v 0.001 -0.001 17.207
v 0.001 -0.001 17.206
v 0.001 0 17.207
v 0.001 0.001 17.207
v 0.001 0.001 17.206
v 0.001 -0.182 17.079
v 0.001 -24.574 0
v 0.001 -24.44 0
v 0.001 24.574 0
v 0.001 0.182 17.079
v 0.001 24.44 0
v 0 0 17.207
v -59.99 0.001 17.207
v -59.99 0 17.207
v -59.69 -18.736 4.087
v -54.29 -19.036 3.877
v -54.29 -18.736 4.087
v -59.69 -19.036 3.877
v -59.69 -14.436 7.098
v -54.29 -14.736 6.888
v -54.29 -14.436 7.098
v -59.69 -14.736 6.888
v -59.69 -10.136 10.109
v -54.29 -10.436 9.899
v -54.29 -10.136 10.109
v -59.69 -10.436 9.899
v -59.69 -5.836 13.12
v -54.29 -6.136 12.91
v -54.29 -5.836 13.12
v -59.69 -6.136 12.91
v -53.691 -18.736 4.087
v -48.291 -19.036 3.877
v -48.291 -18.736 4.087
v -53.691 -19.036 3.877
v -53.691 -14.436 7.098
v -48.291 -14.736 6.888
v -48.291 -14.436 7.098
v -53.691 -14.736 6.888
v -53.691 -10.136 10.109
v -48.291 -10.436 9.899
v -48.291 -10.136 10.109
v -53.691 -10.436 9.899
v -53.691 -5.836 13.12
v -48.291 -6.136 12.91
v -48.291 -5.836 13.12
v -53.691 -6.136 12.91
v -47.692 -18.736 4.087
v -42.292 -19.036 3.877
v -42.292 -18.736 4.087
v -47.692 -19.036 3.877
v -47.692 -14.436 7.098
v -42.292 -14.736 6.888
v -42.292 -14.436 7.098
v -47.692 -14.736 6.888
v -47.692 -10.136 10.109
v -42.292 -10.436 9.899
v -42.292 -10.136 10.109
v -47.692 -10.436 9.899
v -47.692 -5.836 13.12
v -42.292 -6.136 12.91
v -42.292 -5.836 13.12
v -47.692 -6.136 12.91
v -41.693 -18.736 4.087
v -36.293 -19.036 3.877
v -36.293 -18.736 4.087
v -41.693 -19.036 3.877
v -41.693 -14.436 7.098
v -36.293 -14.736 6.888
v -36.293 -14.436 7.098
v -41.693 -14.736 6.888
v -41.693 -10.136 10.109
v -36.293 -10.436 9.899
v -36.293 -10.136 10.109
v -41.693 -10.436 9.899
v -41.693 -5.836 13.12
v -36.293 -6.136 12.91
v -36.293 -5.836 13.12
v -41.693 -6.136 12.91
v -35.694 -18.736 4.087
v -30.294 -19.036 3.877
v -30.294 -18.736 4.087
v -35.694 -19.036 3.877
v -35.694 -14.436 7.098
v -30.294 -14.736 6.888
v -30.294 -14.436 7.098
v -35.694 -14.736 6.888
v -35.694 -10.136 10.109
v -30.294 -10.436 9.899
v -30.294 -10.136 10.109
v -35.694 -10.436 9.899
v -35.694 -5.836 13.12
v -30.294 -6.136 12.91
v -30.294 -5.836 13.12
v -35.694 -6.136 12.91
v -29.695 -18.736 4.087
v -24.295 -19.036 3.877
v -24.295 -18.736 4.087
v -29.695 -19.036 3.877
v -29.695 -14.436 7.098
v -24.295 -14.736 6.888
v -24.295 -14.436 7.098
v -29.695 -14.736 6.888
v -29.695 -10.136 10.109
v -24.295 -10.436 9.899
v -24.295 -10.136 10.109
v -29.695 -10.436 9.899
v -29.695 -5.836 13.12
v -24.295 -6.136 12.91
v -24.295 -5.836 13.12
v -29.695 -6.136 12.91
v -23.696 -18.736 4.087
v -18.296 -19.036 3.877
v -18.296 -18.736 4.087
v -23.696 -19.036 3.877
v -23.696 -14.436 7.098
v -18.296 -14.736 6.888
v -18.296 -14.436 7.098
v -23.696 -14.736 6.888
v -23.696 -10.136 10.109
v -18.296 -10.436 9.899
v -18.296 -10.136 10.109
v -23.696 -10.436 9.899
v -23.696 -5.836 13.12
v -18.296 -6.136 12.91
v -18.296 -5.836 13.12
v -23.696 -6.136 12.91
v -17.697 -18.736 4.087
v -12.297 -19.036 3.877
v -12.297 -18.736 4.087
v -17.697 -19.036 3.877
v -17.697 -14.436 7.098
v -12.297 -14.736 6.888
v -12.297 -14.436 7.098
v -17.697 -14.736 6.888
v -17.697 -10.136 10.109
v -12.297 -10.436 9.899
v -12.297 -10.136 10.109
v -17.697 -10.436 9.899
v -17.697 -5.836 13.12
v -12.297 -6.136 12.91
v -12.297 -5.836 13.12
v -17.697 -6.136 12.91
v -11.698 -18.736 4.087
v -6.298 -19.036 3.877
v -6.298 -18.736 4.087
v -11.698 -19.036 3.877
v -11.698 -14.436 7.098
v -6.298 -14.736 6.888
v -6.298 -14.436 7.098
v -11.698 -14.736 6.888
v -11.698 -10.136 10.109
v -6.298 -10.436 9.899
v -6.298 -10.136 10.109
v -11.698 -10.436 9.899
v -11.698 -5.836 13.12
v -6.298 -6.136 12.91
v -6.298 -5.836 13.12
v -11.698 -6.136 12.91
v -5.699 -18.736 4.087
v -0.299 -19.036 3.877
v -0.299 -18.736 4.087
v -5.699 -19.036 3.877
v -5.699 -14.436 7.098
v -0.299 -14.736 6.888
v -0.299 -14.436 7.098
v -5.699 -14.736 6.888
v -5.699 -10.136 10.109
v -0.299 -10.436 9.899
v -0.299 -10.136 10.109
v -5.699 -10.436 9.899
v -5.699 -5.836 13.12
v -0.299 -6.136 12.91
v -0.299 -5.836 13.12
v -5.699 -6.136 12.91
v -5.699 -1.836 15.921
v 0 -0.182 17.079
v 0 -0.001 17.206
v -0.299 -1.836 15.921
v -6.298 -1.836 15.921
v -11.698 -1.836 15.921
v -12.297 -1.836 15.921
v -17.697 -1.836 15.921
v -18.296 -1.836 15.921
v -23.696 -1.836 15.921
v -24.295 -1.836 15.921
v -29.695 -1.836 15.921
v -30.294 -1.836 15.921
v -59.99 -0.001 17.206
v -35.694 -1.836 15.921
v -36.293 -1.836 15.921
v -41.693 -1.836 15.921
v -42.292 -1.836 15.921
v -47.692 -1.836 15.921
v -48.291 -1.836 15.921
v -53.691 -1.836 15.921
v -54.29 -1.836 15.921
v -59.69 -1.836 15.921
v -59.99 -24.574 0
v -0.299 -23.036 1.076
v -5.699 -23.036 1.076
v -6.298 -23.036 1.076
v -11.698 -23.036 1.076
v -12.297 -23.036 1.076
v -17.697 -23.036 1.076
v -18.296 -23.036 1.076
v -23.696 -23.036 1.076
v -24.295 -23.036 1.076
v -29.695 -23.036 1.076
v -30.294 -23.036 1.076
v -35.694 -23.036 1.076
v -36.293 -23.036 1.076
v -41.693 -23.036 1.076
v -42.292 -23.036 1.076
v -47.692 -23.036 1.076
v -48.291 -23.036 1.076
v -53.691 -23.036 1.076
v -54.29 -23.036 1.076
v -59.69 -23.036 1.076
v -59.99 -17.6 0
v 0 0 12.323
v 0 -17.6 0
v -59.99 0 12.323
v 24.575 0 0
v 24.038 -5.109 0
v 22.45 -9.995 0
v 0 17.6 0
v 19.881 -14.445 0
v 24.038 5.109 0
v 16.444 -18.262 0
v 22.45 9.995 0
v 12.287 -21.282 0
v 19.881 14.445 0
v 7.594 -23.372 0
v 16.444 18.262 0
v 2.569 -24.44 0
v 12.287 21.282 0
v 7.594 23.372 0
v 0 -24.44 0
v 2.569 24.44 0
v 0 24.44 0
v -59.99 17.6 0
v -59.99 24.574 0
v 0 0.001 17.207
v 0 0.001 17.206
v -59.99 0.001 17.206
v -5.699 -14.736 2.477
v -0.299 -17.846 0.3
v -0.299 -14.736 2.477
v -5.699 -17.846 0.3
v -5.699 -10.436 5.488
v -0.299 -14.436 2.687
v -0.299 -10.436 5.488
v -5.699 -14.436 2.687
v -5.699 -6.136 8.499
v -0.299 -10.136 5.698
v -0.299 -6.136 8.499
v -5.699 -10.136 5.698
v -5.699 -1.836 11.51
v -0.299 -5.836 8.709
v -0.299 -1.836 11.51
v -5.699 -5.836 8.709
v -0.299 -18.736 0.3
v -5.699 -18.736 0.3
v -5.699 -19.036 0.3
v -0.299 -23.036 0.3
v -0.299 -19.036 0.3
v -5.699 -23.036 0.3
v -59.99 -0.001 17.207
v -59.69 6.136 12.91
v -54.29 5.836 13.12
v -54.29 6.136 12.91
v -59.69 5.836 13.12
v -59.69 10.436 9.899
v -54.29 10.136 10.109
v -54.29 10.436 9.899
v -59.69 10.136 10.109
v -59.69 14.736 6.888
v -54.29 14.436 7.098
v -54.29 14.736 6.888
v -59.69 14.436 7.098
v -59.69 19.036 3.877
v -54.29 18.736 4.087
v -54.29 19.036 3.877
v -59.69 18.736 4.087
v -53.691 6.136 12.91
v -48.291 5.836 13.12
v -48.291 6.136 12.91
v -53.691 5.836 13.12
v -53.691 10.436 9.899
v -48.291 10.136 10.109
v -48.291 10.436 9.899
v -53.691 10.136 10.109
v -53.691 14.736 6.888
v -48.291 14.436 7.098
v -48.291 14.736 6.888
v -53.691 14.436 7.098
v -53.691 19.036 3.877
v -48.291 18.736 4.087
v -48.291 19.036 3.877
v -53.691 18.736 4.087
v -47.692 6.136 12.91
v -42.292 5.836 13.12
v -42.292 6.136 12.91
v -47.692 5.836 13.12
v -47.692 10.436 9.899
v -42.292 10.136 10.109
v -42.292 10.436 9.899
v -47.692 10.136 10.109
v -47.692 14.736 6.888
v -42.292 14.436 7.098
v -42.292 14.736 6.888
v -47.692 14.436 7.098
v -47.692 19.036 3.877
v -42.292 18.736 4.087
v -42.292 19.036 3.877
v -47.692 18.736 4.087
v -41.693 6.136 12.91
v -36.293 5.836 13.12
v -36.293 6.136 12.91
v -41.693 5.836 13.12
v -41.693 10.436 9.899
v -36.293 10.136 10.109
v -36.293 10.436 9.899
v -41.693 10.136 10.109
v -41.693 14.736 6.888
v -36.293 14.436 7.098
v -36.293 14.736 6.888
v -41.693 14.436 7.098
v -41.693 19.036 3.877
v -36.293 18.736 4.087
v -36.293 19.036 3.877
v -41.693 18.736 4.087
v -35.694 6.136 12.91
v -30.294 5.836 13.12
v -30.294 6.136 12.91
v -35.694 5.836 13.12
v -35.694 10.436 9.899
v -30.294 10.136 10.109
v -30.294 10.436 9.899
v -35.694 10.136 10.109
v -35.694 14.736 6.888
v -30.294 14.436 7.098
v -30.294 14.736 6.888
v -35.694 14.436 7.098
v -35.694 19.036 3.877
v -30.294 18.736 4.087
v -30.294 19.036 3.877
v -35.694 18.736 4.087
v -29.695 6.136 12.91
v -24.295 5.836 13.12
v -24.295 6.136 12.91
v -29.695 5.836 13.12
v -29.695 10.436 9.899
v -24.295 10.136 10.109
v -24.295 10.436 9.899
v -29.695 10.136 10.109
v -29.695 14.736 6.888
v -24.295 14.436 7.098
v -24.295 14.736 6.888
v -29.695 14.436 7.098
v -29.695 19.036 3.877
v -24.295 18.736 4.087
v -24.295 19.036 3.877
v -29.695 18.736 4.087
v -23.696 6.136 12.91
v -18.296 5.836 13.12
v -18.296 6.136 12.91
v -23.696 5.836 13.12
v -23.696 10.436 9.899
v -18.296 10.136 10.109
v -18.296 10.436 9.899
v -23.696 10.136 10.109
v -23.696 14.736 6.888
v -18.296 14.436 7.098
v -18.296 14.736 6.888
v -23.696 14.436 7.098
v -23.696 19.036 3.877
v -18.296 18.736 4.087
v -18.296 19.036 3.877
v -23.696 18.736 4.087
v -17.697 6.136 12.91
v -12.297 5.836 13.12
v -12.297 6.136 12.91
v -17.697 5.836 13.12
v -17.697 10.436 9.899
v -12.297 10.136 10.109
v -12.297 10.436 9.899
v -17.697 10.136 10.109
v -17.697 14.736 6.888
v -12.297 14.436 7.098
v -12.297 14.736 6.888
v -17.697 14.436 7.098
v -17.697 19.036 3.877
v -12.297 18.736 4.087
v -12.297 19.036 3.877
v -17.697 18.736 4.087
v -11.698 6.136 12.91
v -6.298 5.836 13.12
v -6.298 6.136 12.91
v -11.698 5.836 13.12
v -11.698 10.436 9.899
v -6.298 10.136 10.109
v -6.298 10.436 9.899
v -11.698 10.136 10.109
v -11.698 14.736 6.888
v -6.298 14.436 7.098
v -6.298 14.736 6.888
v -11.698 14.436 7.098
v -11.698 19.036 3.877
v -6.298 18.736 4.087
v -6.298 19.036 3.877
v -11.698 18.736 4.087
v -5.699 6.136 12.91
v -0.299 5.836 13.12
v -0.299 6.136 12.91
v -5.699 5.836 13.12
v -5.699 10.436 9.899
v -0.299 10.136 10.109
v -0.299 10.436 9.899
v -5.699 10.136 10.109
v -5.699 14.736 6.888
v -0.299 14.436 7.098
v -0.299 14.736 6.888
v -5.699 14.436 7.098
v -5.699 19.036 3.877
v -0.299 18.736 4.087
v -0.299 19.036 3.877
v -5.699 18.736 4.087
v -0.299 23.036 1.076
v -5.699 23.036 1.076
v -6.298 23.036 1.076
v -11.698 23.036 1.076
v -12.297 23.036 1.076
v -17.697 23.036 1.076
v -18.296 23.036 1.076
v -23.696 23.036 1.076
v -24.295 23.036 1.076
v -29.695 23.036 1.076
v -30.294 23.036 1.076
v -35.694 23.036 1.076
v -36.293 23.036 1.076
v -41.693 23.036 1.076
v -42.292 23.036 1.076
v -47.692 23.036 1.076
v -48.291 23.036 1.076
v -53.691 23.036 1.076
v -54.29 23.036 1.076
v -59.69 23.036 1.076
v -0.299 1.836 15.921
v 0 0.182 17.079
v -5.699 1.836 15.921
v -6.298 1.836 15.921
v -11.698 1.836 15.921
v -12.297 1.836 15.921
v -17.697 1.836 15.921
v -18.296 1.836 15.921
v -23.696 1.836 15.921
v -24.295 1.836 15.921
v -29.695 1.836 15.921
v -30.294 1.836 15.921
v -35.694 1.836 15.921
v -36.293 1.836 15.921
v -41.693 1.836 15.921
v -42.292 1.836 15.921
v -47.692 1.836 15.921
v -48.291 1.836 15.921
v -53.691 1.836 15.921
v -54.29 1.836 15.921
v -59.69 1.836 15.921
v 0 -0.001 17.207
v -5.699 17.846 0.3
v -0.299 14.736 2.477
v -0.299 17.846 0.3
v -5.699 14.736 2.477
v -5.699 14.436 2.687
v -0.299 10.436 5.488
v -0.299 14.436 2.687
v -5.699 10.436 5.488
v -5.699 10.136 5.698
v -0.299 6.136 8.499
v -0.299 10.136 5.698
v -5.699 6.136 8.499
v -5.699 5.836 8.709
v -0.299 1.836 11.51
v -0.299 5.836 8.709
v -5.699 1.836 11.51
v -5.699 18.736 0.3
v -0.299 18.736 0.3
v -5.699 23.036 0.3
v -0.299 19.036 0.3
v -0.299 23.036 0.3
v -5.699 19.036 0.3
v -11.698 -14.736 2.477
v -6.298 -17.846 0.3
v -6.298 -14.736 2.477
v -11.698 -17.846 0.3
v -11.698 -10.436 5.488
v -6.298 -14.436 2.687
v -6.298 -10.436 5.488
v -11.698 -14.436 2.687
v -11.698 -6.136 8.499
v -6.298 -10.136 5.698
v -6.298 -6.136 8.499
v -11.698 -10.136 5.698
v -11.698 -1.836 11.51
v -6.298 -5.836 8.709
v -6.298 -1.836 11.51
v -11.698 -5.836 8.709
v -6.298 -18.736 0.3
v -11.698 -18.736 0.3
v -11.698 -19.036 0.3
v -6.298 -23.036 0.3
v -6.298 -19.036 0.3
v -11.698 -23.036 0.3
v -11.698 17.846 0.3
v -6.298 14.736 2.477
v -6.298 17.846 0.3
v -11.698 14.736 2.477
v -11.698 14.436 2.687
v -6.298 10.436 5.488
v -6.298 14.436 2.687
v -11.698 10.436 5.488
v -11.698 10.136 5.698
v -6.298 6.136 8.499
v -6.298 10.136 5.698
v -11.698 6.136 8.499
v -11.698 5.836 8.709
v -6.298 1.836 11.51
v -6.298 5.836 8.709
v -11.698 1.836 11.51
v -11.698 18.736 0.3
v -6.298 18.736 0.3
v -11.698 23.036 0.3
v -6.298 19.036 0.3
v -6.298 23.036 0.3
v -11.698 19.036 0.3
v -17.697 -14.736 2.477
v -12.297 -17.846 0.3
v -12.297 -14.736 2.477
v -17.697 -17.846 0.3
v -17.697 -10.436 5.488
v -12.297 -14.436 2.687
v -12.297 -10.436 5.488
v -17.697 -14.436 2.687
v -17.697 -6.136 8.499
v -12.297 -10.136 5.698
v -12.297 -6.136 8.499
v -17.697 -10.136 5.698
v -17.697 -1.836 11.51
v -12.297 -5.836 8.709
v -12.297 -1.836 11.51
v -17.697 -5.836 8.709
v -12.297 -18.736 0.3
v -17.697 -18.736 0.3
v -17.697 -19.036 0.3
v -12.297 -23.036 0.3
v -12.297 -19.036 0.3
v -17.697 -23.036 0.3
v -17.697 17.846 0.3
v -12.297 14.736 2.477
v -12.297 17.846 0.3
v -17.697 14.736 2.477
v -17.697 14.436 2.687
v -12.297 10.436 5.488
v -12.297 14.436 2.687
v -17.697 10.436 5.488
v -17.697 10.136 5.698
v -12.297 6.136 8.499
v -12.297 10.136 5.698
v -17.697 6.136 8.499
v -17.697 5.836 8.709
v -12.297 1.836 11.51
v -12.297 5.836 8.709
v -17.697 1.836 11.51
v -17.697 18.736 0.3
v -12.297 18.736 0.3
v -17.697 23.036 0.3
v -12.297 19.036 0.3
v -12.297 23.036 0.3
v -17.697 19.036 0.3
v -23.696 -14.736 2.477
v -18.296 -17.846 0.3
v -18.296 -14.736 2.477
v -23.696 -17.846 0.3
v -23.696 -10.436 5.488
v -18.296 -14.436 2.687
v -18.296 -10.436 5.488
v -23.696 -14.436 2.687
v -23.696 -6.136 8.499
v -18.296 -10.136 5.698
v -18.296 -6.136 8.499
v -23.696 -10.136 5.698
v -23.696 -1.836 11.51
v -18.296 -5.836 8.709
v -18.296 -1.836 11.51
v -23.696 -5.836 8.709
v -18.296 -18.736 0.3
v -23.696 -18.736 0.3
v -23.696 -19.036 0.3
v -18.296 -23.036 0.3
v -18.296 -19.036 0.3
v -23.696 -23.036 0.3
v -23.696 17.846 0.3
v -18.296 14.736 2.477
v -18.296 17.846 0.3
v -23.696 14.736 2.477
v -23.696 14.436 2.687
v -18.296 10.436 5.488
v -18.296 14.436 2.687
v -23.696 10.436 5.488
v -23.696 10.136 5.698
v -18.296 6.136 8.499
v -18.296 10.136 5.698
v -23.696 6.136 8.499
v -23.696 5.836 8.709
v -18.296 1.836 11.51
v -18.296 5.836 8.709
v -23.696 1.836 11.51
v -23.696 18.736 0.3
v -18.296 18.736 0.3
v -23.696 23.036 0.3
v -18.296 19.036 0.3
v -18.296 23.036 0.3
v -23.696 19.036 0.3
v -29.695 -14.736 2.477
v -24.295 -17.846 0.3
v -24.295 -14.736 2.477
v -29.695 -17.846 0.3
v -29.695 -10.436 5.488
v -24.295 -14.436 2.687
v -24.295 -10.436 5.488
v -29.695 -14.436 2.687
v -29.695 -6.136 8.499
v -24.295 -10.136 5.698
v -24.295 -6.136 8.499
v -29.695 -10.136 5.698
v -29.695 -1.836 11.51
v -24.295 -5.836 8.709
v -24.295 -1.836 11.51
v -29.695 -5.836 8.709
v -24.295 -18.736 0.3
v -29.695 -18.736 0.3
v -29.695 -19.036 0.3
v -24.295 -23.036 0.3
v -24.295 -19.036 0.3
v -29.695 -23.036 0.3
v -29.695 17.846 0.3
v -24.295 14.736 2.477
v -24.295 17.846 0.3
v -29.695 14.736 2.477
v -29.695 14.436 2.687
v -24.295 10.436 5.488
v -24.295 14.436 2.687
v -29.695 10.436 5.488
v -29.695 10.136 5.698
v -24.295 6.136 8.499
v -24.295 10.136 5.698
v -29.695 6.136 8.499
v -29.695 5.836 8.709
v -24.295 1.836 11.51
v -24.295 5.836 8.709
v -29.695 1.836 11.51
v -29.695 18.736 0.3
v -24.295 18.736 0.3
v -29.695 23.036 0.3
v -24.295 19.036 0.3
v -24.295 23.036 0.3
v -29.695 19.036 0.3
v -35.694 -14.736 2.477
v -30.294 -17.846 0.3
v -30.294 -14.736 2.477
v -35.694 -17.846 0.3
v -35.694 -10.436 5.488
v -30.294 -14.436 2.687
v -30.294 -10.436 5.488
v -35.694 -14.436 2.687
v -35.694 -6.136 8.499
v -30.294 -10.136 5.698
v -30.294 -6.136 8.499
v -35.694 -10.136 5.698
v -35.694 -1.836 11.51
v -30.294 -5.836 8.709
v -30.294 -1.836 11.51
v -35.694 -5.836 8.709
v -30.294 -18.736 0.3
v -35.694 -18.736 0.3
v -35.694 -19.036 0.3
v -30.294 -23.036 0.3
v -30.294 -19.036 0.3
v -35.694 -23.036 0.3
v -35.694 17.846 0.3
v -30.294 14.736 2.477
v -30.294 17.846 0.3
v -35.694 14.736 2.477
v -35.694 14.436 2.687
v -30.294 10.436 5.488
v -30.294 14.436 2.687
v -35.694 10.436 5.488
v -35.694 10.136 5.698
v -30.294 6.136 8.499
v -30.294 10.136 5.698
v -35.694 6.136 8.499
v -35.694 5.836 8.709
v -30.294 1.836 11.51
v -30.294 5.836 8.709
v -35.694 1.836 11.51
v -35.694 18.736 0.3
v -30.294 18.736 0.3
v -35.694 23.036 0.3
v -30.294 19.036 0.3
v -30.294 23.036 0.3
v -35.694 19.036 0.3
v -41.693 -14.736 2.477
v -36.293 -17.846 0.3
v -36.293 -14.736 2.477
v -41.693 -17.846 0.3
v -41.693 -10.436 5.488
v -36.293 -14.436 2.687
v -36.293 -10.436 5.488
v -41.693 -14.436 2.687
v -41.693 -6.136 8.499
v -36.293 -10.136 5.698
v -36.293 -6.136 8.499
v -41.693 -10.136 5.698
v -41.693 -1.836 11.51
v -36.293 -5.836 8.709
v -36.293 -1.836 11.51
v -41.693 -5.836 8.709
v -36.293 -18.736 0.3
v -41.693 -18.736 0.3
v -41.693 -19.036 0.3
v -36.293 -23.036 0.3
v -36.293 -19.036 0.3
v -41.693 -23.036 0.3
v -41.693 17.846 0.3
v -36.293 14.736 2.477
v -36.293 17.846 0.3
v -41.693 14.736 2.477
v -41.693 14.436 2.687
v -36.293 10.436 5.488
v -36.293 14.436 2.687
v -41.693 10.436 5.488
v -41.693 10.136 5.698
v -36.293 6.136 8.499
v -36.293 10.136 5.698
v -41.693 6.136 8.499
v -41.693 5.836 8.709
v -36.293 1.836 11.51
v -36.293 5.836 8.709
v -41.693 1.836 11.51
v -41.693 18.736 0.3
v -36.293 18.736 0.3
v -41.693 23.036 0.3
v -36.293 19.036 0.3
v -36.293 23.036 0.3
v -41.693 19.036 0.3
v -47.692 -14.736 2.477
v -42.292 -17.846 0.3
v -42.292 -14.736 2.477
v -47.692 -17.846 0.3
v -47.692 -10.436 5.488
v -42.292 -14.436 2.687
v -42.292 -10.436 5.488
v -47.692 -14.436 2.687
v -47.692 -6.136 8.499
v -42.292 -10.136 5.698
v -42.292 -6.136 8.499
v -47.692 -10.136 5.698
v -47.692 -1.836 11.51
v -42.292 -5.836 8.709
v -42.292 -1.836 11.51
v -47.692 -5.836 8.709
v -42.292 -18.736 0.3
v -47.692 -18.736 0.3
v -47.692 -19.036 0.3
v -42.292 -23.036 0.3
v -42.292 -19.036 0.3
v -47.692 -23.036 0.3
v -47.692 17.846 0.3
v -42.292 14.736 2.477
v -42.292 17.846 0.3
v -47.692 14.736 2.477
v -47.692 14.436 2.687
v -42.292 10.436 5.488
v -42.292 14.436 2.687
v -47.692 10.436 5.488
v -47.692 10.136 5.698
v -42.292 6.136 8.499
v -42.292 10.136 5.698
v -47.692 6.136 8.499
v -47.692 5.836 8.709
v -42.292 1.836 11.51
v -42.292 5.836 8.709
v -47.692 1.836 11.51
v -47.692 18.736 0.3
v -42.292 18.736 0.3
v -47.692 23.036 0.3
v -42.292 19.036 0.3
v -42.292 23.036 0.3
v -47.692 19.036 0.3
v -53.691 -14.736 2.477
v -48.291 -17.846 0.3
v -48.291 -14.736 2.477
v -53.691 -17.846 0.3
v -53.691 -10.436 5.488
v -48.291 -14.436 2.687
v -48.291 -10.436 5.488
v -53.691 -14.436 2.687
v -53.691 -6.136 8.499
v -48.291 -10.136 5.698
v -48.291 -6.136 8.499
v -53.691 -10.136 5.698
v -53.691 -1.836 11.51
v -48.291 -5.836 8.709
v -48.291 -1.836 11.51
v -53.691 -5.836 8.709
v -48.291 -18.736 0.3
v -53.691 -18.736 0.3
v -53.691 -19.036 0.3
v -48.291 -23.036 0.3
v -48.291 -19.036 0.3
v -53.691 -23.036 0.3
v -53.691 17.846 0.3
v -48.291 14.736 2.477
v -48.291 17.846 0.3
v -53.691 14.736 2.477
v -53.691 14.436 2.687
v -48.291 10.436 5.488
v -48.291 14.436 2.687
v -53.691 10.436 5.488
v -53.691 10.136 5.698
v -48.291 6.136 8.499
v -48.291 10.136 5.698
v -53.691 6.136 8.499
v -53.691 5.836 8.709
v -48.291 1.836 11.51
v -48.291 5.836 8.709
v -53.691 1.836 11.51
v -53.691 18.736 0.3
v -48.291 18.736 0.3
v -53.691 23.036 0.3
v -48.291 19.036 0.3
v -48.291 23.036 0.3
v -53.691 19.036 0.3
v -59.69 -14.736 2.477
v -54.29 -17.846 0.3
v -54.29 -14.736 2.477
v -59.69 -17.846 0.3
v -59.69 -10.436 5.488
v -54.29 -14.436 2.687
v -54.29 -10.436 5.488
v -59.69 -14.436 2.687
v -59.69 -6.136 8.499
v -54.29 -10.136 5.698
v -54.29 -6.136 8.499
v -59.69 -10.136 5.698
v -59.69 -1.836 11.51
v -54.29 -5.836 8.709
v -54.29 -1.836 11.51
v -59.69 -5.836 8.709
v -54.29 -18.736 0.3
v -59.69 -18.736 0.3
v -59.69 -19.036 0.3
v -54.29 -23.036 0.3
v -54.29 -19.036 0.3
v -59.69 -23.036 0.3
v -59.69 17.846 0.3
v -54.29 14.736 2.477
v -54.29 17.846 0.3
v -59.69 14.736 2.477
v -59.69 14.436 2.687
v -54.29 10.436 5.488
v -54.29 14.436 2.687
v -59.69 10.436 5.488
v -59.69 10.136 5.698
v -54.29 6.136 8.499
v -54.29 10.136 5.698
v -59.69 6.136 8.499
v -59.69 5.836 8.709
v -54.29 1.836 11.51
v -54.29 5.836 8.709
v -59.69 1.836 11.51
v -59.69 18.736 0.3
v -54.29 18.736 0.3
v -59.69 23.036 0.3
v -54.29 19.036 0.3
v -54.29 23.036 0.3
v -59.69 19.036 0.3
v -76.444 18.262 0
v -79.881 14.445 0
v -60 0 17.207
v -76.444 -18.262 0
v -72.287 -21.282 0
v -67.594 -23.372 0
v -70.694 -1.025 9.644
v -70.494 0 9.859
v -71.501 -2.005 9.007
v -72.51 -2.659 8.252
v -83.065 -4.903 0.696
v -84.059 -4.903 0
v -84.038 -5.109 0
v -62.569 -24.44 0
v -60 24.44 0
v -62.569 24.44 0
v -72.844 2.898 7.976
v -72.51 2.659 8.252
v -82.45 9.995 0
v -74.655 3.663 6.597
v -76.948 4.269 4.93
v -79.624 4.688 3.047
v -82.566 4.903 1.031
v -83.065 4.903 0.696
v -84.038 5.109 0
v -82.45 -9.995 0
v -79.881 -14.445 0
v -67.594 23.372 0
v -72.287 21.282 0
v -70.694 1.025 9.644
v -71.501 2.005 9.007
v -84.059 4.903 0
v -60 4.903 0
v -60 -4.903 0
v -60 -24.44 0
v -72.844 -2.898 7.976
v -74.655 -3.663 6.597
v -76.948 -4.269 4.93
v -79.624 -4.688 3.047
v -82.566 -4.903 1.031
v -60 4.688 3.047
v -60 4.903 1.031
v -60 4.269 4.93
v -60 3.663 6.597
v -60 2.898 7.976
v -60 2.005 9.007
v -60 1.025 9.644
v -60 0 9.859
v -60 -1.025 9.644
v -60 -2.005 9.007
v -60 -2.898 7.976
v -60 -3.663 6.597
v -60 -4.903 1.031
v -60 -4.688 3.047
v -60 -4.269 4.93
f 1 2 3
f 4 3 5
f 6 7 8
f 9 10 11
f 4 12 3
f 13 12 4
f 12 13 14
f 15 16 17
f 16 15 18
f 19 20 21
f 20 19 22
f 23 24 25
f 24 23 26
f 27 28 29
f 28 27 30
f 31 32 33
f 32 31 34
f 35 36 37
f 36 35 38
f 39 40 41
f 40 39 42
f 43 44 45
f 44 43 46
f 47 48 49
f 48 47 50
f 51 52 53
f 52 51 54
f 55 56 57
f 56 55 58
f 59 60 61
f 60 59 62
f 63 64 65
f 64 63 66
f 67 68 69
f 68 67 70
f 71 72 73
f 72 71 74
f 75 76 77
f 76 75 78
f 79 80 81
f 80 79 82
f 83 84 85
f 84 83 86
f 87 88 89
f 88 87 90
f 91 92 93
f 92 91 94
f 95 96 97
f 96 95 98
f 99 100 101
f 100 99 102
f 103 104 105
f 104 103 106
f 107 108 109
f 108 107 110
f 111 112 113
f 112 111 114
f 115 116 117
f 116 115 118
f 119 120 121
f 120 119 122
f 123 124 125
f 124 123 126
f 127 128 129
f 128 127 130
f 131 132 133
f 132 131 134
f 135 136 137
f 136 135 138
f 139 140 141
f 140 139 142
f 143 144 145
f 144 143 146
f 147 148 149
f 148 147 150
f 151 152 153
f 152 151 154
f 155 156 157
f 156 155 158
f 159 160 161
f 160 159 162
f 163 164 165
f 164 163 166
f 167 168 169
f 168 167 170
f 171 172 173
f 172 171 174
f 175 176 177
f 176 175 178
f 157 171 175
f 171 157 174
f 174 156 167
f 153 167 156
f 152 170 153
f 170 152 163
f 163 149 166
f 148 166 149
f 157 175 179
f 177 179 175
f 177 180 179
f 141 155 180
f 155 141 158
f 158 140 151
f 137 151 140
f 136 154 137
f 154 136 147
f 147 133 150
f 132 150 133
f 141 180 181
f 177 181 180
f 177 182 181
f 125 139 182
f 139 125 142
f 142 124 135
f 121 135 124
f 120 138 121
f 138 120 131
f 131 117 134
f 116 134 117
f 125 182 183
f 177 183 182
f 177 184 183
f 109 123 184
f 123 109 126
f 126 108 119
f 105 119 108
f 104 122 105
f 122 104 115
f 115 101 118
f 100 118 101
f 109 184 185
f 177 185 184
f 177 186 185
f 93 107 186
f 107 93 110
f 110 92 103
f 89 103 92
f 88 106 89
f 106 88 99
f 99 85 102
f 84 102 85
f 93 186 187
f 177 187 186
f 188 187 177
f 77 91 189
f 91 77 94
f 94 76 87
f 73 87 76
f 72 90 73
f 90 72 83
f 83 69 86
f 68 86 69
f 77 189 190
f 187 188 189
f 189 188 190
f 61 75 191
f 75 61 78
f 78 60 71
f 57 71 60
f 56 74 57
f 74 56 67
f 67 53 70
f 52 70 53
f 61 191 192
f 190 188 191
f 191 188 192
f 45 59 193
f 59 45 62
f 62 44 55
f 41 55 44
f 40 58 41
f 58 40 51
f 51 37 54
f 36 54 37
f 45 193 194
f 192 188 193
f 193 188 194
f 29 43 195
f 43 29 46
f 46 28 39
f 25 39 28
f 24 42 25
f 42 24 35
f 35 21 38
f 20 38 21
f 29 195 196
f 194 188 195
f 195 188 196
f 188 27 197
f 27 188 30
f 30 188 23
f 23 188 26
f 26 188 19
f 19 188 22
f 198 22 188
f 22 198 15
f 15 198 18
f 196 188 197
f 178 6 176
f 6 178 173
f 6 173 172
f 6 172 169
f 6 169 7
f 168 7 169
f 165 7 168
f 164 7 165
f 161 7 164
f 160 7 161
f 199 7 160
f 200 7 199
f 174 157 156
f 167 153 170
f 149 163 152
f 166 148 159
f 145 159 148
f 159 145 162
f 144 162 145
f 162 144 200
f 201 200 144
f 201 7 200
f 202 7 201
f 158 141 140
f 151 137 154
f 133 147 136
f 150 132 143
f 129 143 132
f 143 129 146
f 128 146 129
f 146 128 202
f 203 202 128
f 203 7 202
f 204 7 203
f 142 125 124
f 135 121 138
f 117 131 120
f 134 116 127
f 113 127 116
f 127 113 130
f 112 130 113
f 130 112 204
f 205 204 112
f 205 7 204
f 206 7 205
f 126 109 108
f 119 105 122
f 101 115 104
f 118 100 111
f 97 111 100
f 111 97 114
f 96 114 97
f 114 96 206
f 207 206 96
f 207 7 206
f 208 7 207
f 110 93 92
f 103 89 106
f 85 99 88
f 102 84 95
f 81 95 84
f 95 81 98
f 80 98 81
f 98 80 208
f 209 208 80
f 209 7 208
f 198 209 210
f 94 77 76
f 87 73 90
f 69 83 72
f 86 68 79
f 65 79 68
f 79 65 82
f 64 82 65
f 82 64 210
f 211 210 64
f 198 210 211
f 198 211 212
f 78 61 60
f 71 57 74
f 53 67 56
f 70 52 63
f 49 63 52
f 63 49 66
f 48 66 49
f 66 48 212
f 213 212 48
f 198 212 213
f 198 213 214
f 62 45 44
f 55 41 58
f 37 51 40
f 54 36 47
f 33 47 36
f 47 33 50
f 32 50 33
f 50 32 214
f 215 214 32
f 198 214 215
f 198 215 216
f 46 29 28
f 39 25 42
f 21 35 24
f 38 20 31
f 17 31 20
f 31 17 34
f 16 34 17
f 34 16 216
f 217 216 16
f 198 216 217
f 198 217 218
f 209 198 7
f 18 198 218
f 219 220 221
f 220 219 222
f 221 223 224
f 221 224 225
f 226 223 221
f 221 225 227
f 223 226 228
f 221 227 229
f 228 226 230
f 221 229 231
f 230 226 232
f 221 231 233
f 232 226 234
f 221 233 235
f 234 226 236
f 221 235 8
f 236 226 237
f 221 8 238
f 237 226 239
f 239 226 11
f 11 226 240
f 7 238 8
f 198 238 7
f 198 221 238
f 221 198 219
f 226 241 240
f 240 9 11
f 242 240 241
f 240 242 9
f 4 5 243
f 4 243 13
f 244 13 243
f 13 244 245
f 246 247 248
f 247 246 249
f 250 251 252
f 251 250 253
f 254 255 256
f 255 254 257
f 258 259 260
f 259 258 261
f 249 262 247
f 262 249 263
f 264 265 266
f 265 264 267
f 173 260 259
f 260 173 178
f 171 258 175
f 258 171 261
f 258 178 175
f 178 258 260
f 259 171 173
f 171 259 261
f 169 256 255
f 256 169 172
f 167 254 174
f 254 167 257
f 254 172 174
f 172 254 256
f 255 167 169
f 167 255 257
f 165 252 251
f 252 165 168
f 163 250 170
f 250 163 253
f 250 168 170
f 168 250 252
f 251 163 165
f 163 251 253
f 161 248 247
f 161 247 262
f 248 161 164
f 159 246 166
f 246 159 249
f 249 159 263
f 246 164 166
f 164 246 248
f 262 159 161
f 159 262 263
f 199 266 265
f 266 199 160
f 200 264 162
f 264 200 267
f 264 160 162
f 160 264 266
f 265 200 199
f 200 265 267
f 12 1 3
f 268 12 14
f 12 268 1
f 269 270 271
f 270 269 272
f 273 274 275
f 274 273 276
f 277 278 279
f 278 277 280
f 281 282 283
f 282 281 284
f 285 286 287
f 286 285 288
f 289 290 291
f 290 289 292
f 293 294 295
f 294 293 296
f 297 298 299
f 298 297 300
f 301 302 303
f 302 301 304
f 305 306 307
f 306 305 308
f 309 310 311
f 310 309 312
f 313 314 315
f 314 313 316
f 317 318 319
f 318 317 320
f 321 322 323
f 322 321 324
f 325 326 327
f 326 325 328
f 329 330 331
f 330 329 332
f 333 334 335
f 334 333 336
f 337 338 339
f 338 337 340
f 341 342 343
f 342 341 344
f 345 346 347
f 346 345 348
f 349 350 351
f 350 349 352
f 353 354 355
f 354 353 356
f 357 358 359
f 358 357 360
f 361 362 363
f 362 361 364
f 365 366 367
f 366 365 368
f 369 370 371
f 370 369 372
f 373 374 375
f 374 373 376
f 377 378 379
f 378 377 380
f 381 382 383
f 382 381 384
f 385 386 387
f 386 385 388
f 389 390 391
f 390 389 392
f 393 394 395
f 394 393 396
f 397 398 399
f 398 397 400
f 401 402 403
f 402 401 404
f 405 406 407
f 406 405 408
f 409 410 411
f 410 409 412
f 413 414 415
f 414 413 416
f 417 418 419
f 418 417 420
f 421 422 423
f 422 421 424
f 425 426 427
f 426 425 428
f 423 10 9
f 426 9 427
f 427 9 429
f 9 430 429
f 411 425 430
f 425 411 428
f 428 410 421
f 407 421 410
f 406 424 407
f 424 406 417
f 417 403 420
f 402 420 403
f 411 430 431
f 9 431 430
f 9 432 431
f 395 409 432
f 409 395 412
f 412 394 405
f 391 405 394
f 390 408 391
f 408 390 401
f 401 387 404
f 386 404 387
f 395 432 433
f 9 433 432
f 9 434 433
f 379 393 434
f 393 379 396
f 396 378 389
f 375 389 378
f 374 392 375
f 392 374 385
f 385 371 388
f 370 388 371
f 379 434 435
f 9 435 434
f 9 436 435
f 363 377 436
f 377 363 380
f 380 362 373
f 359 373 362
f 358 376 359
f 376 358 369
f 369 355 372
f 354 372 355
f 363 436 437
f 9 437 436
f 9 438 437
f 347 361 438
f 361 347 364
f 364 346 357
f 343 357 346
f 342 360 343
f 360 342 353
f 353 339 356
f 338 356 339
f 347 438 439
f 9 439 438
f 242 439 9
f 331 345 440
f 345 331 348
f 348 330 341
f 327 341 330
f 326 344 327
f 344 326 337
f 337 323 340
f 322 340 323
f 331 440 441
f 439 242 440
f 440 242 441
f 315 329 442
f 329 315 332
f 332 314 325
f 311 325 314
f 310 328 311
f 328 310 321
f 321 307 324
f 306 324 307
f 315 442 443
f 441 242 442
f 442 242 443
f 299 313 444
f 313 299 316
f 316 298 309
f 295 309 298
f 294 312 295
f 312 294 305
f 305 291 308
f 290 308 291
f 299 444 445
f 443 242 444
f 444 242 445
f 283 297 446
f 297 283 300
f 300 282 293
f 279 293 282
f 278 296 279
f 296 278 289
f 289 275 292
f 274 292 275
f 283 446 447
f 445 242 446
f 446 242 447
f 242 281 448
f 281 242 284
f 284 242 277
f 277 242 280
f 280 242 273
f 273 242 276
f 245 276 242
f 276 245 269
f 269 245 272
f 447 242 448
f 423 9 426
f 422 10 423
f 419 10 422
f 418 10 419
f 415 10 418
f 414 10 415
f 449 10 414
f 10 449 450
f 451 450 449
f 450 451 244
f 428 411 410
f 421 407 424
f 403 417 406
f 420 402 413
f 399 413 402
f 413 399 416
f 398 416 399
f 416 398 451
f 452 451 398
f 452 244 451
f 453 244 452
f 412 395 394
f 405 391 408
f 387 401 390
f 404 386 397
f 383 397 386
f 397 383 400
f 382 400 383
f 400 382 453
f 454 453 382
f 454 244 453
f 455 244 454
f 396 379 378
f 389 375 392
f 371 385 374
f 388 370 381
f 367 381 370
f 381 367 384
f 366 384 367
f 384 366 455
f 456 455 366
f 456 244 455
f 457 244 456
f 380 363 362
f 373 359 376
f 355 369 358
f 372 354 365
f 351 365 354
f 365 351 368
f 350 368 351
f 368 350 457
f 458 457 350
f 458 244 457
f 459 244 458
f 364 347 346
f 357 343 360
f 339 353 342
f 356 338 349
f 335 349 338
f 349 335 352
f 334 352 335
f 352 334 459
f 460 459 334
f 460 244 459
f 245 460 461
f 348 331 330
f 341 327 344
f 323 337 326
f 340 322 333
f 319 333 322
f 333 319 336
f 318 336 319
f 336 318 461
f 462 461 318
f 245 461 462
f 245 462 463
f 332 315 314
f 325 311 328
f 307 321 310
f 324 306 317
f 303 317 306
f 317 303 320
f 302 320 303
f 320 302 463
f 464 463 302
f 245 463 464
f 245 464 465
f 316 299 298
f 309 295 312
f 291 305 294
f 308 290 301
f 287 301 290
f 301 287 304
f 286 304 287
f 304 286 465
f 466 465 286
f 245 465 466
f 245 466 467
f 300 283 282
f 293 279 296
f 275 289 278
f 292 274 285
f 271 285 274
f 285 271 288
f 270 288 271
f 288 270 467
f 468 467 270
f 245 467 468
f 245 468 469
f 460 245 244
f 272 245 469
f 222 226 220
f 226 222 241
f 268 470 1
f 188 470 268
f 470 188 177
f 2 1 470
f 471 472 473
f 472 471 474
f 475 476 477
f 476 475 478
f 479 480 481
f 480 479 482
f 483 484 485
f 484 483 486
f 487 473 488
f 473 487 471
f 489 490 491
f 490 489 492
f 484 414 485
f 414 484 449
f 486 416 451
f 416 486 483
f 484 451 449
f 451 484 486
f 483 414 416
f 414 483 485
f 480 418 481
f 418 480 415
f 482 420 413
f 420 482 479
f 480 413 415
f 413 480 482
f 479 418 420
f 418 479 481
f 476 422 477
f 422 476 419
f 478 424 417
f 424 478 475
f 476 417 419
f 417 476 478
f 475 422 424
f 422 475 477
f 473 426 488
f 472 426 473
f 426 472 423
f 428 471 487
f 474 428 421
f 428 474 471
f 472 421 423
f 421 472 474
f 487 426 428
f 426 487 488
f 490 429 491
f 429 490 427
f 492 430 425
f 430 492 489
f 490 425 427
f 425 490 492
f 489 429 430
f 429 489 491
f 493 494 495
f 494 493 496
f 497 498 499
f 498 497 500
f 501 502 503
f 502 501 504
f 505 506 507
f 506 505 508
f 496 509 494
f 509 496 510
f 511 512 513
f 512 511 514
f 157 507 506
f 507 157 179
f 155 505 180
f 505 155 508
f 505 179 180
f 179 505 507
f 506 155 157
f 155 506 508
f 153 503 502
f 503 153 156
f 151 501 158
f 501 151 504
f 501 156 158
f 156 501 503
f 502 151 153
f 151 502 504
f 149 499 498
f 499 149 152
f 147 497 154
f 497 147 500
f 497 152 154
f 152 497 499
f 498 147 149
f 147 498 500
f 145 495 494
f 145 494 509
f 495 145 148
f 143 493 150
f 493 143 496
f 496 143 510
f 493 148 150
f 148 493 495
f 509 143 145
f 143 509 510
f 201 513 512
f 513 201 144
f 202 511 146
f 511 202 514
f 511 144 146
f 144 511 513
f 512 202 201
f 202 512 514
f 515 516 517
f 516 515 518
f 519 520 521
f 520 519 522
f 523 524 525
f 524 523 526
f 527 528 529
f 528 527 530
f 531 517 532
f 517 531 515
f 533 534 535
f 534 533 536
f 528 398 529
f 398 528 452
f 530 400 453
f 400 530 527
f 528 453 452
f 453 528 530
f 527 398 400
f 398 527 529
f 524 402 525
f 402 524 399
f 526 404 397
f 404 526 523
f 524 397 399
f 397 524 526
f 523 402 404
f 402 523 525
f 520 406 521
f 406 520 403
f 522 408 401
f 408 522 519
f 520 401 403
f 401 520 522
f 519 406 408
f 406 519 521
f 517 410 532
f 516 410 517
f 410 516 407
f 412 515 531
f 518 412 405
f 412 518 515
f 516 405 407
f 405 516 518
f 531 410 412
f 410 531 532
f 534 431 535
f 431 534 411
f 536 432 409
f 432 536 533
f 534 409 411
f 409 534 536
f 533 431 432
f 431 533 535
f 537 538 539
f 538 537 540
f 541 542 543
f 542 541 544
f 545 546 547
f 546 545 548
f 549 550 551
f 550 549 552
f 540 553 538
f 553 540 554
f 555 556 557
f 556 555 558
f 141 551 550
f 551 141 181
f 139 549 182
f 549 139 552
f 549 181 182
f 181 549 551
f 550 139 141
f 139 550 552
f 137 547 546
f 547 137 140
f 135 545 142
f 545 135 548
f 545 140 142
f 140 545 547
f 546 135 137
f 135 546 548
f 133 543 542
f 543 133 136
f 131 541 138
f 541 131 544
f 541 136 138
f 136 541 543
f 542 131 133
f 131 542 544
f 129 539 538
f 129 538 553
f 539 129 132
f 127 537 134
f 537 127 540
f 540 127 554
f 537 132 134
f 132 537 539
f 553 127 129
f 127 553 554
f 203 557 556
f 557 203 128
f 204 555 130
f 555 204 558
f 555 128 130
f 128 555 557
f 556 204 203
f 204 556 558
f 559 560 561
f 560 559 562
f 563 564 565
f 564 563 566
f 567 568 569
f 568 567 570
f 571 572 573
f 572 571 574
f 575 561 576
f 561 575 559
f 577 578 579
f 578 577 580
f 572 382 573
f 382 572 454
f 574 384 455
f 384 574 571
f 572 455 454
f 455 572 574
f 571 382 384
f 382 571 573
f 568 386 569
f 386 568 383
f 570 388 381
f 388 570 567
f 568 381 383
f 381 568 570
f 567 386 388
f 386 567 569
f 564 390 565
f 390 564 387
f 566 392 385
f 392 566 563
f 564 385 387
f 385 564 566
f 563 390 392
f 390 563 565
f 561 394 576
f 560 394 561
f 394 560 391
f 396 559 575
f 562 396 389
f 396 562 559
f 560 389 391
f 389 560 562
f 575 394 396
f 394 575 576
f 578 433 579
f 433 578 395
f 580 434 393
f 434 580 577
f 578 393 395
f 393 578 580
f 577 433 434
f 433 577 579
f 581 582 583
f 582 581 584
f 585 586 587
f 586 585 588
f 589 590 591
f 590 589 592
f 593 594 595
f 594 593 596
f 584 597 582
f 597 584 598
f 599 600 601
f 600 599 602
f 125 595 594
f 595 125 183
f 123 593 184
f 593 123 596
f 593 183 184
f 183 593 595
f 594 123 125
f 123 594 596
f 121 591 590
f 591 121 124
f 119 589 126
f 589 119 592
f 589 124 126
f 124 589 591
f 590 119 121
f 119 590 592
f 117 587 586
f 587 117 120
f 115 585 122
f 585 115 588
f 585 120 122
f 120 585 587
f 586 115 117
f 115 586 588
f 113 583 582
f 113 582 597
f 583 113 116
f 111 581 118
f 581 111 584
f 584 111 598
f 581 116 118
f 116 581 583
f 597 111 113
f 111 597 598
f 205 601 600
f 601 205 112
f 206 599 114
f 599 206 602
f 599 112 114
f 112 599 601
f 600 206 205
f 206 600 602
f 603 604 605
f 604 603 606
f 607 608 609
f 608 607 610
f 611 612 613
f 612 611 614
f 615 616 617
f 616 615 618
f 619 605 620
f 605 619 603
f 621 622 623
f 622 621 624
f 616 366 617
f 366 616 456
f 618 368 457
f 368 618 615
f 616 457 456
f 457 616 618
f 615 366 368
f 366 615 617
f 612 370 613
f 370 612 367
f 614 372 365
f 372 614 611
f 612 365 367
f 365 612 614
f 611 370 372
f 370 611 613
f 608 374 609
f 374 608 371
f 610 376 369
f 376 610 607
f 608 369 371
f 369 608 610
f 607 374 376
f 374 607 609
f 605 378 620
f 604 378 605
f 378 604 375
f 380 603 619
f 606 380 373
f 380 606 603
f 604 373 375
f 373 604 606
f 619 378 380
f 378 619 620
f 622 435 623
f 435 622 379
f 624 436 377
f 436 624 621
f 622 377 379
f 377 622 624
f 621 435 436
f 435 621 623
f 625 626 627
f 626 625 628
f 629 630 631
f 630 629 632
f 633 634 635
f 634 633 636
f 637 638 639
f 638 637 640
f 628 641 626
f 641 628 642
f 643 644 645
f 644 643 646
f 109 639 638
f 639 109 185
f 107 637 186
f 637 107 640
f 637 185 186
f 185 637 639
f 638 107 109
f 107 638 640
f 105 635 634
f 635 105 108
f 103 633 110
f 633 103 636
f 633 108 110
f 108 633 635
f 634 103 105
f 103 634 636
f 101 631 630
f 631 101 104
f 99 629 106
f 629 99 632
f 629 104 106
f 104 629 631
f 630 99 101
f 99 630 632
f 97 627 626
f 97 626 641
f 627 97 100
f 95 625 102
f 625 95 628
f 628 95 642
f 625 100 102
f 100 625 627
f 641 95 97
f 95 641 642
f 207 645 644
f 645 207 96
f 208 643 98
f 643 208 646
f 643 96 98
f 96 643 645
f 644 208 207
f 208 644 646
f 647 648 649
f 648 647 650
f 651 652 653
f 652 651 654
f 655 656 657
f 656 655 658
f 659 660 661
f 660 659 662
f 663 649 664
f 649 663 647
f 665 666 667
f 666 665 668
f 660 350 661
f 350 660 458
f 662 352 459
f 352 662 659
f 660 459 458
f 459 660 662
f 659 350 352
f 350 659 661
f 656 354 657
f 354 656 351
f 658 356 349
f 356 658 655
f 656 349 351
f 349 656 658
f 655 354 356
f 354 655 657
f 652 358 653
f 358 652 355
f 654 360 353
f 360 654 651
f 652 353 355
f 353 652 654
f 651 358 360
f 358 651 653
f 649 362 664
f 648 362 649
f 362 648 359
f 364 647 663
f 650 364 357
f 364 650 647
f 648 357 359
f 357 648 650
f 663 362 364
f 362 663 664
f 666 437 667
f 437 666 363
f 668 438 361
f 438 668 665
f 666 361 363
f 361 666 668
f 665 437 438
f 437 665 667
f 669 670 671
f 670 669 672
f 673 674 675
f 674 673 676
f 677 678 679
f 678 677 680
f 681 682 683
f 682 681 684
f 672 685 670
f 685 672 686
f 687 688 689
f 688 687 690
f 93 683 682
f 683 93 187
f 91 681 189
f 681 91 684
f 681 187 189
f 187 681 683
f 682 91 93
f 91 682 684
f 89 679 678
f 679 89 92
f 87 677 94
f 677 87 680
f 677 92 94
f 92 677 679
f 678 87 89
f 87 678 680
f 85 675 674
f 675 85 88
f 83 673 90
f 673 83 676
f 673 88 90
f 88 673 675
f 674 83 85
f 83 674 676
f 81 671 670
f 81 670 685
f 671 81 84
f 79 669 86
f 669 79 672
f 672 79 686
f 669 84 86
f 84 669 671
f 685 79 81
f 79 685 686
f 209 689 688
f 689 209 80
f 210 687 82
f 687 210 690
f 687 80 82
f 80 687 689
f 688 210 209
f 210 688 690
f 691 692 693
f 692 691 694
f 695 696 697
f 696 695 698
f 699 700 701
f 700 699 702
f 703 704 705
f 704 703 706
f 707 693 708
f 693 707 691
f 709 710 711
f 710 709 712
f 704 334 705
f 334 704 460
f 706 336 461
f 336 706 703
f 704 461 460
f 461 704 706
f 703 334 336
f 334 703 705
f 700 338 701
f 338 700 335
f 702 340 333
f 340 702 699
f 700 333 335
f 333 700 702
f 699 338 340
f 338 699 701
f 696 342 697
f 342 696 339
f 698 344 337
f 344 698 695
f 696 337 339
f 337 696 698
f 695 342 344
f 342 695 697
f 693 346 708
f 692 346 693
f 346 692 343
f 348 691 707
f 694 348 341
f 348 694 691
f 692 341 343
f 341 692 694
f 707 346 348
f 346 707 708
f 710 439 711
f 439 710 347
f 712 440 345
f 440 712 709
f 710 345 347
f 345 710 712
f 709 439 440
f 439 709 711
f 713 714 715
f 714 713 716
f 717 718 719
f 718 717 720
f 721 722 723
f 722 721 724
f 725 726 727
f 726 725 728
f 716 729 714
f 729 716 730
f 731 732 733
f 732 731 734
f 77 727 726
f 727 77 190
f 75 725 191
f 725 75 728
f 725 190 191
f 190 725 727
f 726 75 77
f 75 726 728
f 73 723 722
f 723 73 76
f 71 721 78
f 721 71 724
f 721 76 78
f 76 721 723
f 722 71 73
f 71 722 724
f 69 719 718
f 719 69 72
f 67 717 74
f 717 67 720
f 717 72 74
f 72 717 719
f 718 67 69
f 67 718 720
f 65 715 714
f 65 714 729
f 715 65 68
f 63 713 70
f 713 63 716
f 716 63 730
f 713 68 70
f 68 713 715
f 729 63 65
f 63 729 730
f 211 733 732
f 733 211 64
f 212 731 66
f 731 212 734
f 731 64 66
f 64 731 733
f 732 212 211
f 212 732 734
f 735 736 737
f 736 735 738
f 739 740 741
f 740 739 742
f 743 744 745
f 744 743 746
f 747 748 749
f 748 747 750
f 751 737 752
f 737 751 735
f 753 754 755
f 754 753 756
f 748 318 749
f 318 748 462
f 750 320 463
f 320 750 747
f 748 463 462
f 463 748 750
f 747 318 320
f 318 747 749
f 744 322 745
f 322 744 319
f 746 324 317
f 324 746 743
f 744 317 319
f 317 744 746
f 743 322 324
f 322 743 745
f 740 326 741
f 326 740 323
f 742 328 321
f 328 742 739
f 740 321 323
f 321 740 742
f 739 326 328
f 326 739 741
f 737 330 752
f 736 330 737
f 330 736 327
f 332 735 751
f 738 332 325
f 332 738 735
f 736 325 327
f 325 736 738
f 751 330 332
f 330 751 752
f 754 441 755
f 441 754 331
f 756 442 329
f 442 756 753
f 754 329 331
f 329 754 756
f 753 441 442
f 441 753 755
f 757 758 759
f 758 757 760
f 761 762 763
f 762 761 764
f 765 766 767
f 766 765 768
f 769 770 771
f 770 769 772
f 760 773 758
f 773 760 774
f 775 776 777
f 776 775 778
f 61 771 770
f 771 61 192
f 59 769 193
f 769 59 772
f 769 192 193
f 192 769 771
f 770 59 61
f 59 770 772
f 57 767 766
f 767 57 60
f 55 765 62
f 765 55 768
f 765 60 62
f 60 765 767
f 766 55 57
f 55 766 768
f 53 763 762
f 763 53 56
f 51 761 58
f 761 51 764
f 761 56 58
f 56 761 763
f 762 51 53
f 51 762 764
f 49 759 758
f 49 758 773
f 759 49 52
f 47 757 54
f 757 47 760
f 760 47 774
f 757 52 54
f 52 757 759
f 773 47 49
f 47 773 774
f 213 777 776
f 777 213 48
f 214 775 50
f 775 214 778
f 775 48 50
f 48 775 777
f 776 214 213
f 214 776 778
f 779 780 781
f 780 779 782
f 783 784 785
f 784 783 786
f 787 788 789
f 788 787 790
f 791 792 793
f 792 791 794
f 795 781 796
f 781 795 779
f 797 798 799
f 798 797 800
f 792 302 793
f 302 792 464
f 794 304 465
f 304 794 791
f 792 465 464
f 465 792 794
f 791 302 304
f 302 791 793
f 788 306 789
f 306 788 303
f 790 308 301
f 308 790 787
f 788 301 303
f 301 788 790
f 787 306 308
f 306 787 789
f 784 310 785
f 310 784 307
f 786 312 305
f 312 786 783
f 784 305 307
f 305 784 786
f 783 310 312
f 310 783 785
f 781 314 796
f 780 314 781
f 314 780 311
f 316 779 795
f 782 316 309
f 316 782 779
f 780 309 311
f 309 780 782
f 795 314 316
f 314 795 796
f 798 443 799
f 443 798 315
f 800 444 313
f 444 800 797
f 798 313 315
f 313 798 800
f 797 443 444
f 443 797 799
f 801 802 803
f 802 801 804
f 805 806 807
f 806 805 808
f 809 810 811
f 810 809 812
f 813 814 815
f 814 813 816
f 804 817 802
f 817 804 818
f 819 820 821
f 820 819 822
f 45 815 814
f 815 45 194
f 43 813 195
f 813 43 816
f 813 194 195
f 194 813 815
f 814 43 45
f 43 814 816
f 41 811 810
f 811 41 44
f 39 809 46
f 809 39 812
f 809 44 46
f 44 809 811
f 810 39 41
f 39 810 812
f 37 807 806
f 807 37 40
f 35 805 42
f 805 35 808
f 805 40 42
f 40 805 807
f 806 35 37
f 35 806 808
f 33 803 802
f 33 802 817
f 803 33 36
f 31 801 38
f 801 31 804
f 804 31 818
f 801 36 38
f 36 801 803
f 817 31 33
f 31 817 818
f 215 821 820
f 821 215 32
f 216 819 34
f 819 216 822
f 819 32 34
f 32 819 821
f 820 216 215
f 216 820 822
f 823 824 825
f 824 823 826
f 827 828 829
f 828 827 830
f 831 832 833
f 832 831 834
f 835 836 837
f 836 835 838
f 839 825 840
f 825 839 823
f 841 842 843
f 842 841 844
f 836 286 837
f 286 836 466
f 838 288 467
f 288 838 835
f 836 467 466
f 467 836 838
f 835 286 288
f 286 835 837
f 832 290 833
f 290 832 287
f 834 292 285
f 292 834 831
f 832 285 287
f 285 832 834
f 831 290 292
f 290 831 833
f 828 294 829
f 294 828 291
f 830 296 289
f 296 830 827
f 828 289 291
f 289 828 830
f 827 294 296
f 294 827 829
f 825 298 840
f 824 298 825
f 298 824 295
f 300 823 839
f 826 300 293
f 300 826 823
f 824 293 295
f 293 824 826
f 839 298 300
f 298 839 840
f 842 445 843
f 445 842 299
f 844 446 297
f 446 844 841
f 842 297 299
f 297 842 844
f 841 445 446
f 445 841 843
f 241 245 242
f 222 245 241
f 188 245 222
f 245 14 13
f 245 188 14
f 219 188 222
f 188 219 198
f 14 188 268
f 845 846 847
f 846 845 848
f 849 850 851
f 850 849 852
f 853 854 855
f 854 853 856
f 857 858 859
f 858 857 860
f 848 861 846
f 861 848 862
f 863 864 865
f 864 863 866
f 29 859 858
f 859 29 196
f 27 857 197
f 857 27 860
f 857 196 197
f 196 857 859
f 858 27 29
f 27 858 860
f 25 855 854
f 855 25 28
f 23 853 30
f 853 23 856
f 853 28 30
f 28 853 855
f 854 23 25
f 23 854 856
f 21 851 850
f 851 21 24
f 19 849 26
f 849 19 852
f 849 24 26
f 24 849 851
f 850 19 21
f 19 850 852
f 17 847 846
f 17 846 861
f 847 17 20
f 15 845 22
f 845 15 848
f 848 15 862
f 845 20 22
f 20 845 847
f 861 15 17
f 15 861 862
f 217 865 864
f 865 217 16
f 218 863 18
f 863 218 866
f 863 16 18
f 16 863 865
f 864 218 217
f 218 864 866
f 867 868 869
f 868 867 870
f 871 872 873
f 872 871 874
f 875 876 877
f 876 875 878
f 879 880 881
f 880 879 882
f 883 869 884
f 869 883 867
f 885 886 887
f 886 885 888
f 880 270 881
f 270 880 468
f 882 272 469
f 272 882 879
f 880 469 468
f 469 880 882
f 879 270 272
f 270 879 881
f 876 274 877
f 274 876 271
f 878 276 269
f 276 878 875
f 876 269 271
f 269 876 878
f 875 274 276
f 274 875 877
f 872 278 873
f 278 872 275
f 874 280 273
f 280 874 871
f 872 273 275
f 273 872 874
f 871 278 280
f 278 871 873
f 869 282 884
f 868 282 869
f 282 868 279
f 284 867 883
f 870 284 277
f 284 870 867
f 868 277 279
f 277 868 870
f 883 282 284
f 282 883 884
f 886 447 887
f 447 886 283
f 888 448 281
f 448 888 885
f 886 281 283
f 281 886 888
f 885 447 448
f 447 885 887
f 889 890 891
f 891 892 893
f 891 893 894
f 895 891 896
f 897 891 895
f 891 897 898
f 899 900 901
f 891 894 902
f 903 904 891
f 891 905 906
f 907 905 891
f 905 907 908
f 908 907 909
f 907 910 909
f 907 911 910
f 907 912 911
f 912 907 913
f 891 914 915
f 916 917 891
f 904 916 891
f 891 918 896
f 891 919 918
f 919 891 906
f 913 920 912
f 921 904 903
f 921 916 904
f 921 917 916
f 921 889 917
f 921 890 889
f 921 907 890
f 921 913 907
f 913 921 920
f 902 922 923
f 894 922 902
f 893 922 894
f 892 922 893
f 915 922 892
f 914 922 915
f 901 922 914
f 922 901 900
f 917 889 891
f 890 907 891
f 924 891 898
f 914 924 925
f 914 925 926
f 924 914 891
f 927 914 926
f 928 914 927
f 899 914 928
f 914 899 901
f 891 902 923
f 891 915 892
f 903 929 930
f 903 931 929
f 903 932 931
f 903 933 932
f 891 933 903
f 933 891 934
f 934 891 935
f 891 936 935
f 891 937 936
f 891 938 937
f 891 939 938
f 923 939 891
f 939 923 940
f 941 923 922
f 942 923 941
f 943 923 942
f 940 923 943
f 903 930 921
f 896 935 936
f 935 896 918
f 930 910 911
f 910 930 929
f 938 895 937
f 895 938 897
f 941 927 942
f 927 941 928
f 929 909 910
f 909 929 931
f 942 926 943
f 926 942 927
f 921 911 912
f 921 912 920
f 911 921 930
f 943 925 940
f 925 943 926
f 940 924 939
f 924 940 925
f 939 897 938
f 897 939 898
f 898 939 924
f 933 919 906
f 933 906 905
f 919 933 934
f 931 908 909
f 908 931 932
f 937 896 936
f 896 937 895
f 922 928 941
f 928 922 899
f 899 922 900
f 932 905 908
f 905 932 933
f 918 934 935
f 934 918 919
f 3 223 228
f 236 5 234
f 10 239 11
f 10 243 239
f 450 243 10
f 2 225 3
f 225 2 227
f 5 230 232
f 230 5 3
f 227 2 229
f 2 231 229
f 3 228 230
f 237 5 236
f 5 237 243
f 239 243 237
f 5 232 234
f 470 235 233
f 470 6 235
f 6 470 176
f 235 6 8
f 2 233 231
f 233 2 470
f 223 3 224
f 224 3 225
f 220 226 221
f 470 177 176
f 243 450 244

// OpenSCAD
//Customizable struts for regolith-shielded dugout houses
//Ari M. Diacou - June 2014
//Published at: http://www.thingiverse.com/thing:348765
//Shared under Creative Commons License: Attribution-ShareAlike 3.0 Unported (CC BY-SA 3.0) 
//see http://creativecommons.org/licenses/by-sa/3.0/

// preview[view:south west, tilt:top diagonal]

//Width of a strut
width=6;
//Longest outside length of a strut
length=30;
//Transvers thickness of a strut
thickness=4;
//How wide should the bins be in the length direction
bin_width=4;
//How thick should the walls of the bins be
wall_thickness=.3;
//What is the angle the roof makes with the ground
theta=35;
//Do you want to print a a model, assembeled roof, a sheet of struts, or individual struts? 
assembly="model"; // [model, tent, sheet, struts]
//How many struts to print?
num=10;

/*[Hidden]*/

///// Derived Scalars /////
epsilon=0+0.001;//Used to ensure manifoldness
base=length*cos(theta); //edge of roof to roof ridge
height=length*sin(theta); //height of roof ridge from surface
ep=epsilon; //Who actually likes typing all those characters?
inter_strut_distance = sqrt((3*wall_thickness)*(width/10)); //geometric mean used to automatically space the struts a small distance, using 2 definitions of small.
strut_area_approx=thickness*(length-thickness/2);//An approximation of the area of a strut
strut_depth=strut_area_approx/(2*base);//The minimum depth you need to dig to get enough soil to fill a pair of struts
cone_depth=(3.1415/6)*(base*height)/(width*num);//The depth you need to dig to get enough earth for the mounds at the front and back of the structure
echo("You will need to dig down at least ",(strut_depth+cone_depth)," units to have enough earth for this structure");

/////// MAIN() ///////////

if(assembly=="model"){
	tent(num);
	back();
	front();
	}
if(assembly=="tent"){
	tent(num);
	}
if(assembly=="struts"){
	lineupx(num,inter_strut_distance+width) 
		printable_strut();
	}
if(assembly=="sheet"){
	lineupx(num,width-ep) 
		printable_strut();
	}

///// FUNCTIONS /////////

module front(){
	difference(){
		cylinder(h=height,r1=base,r2=0,center=false);
		translate([-base-ep,-base-ep,-ep])
			cube([base+ep,2*(base+ep),height+2*ep],center=false);
		}
	}

module back(){
	translate([-num*width,0,0]){
		difference(){
			cylinder(h=height,r1=base,r2=0,center=false);
			translate([0,-base-ep,-ep])
				cube([base+ep,2*(base+ep),height+2*ep],center=false);
		scale([1,.5,1])
			rotate([0,90,0])
				cylinder(h=2*(base+ep),r=.8*(height-thickness/cos(theta)),center=true);
			}
		}
	}

module tent(num){
	lineupx(num,width-ep) pair();
	}

module printable_strut(){
	translate([0,0,thickness])
		rotate([-theta,0,0])
			translate([2*width,base/2,-height/2])
				left();
	}

//module copy_printable_strut(){
//	translate([
//		2*width,
//		length*(-0.5+cos(theta))-2*thickness*sin(theta),
//		-height*sin(theta)+(-1+sin(theta))*thickness])
//			rotate([-theta,0,0]) 
//				left();
//	}

//module bottom(){
//	delta=thickness-wall_thickness;
//	intersection(){
//		preform();
//		translate([0,delta*cos(theta),-delta*sin(theta)]) preform();
//		}
//	}

module bottom2(){
	delta=thickness-wall_thickness;
	difference(){
		preform();
		translate([0,-wall_thickness*cos(theta),wall_thickness]) preform();
		}
	}

module pair(){
	translate([0,ep,0]) left(); 
	translate([0,-ep,0])right();
	}

module left(){
	union(){
		bottom2();
		difference(){
			preform();
			bins();
			}
		}
	}

module right(){
	mirror([0,1,0])
		left();
	}

module lineupy(num, space) {
   for (i = [1 : num])
     translate([ 0, -space*i, 0 ]) child();
 }

module lineupx(num, space) {
   for (i = [1 : num])
     translate([-space*i,0,0]) child();
 }

module show_regolith(){
	intersection(){
		preform();
		bins();
		}
	}
 
module bins(){
	num_bins=floor(base/(bin_width+wall_thickness));
	diff=base-num_bins*(bin_width+wall_thickness);
	lineupy(num_bins, bin_width+wall_thickness) 
		//color("DarkRed") 
			translate([wall_thickness,-diff/2,0])		
				cube([width-2*wall_thickness,bin_width,height]);
	}

module preform(){
	difference(){
		translate([0,-length*cos(theta)+thickness*sin(theta),-thickness*cos(theta)])
			rotate([theta,0,0]) 
				cube([width,length,thickness],center=false);
		
		//color("blue")	
			translate([-ep,-length-ep,-thickness])
				rotate([0,0,0]) 
					cube([width+2*ep,2*length,thickness],center=false);
		
		//color("red")	
			translate([-ep,thickness,-length])
				rotate([90,0,0]) 
					cube([width+2*ep,2*length,thickness],center=false);
		}
	}
